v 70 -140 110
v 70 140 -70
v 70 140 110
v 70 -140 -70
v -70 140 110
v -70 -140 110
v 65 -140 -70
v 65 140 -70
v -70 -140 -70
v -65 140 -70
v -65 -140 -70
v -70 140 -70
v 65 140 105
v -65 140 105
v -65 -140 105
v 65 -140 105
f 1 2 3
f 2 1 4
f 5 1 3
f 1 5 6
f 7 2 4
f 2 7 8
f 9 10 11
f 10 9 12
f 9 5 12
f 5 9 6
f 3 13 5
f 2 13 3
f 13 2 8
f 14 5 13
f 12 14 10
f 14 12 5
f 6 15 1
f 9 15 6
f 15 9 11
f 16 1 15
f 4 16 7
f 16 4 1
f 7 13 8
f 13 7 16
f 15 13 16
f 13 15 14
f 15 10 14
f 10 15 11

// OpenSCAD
module box_top(h){
	translate([0,0,h]) difference(){
	    cube([140,280,180], center=true);
	    color("blue") translate([0,0,-h]) cube([130,290,210], center=true);

	};

}
box_top(20);
